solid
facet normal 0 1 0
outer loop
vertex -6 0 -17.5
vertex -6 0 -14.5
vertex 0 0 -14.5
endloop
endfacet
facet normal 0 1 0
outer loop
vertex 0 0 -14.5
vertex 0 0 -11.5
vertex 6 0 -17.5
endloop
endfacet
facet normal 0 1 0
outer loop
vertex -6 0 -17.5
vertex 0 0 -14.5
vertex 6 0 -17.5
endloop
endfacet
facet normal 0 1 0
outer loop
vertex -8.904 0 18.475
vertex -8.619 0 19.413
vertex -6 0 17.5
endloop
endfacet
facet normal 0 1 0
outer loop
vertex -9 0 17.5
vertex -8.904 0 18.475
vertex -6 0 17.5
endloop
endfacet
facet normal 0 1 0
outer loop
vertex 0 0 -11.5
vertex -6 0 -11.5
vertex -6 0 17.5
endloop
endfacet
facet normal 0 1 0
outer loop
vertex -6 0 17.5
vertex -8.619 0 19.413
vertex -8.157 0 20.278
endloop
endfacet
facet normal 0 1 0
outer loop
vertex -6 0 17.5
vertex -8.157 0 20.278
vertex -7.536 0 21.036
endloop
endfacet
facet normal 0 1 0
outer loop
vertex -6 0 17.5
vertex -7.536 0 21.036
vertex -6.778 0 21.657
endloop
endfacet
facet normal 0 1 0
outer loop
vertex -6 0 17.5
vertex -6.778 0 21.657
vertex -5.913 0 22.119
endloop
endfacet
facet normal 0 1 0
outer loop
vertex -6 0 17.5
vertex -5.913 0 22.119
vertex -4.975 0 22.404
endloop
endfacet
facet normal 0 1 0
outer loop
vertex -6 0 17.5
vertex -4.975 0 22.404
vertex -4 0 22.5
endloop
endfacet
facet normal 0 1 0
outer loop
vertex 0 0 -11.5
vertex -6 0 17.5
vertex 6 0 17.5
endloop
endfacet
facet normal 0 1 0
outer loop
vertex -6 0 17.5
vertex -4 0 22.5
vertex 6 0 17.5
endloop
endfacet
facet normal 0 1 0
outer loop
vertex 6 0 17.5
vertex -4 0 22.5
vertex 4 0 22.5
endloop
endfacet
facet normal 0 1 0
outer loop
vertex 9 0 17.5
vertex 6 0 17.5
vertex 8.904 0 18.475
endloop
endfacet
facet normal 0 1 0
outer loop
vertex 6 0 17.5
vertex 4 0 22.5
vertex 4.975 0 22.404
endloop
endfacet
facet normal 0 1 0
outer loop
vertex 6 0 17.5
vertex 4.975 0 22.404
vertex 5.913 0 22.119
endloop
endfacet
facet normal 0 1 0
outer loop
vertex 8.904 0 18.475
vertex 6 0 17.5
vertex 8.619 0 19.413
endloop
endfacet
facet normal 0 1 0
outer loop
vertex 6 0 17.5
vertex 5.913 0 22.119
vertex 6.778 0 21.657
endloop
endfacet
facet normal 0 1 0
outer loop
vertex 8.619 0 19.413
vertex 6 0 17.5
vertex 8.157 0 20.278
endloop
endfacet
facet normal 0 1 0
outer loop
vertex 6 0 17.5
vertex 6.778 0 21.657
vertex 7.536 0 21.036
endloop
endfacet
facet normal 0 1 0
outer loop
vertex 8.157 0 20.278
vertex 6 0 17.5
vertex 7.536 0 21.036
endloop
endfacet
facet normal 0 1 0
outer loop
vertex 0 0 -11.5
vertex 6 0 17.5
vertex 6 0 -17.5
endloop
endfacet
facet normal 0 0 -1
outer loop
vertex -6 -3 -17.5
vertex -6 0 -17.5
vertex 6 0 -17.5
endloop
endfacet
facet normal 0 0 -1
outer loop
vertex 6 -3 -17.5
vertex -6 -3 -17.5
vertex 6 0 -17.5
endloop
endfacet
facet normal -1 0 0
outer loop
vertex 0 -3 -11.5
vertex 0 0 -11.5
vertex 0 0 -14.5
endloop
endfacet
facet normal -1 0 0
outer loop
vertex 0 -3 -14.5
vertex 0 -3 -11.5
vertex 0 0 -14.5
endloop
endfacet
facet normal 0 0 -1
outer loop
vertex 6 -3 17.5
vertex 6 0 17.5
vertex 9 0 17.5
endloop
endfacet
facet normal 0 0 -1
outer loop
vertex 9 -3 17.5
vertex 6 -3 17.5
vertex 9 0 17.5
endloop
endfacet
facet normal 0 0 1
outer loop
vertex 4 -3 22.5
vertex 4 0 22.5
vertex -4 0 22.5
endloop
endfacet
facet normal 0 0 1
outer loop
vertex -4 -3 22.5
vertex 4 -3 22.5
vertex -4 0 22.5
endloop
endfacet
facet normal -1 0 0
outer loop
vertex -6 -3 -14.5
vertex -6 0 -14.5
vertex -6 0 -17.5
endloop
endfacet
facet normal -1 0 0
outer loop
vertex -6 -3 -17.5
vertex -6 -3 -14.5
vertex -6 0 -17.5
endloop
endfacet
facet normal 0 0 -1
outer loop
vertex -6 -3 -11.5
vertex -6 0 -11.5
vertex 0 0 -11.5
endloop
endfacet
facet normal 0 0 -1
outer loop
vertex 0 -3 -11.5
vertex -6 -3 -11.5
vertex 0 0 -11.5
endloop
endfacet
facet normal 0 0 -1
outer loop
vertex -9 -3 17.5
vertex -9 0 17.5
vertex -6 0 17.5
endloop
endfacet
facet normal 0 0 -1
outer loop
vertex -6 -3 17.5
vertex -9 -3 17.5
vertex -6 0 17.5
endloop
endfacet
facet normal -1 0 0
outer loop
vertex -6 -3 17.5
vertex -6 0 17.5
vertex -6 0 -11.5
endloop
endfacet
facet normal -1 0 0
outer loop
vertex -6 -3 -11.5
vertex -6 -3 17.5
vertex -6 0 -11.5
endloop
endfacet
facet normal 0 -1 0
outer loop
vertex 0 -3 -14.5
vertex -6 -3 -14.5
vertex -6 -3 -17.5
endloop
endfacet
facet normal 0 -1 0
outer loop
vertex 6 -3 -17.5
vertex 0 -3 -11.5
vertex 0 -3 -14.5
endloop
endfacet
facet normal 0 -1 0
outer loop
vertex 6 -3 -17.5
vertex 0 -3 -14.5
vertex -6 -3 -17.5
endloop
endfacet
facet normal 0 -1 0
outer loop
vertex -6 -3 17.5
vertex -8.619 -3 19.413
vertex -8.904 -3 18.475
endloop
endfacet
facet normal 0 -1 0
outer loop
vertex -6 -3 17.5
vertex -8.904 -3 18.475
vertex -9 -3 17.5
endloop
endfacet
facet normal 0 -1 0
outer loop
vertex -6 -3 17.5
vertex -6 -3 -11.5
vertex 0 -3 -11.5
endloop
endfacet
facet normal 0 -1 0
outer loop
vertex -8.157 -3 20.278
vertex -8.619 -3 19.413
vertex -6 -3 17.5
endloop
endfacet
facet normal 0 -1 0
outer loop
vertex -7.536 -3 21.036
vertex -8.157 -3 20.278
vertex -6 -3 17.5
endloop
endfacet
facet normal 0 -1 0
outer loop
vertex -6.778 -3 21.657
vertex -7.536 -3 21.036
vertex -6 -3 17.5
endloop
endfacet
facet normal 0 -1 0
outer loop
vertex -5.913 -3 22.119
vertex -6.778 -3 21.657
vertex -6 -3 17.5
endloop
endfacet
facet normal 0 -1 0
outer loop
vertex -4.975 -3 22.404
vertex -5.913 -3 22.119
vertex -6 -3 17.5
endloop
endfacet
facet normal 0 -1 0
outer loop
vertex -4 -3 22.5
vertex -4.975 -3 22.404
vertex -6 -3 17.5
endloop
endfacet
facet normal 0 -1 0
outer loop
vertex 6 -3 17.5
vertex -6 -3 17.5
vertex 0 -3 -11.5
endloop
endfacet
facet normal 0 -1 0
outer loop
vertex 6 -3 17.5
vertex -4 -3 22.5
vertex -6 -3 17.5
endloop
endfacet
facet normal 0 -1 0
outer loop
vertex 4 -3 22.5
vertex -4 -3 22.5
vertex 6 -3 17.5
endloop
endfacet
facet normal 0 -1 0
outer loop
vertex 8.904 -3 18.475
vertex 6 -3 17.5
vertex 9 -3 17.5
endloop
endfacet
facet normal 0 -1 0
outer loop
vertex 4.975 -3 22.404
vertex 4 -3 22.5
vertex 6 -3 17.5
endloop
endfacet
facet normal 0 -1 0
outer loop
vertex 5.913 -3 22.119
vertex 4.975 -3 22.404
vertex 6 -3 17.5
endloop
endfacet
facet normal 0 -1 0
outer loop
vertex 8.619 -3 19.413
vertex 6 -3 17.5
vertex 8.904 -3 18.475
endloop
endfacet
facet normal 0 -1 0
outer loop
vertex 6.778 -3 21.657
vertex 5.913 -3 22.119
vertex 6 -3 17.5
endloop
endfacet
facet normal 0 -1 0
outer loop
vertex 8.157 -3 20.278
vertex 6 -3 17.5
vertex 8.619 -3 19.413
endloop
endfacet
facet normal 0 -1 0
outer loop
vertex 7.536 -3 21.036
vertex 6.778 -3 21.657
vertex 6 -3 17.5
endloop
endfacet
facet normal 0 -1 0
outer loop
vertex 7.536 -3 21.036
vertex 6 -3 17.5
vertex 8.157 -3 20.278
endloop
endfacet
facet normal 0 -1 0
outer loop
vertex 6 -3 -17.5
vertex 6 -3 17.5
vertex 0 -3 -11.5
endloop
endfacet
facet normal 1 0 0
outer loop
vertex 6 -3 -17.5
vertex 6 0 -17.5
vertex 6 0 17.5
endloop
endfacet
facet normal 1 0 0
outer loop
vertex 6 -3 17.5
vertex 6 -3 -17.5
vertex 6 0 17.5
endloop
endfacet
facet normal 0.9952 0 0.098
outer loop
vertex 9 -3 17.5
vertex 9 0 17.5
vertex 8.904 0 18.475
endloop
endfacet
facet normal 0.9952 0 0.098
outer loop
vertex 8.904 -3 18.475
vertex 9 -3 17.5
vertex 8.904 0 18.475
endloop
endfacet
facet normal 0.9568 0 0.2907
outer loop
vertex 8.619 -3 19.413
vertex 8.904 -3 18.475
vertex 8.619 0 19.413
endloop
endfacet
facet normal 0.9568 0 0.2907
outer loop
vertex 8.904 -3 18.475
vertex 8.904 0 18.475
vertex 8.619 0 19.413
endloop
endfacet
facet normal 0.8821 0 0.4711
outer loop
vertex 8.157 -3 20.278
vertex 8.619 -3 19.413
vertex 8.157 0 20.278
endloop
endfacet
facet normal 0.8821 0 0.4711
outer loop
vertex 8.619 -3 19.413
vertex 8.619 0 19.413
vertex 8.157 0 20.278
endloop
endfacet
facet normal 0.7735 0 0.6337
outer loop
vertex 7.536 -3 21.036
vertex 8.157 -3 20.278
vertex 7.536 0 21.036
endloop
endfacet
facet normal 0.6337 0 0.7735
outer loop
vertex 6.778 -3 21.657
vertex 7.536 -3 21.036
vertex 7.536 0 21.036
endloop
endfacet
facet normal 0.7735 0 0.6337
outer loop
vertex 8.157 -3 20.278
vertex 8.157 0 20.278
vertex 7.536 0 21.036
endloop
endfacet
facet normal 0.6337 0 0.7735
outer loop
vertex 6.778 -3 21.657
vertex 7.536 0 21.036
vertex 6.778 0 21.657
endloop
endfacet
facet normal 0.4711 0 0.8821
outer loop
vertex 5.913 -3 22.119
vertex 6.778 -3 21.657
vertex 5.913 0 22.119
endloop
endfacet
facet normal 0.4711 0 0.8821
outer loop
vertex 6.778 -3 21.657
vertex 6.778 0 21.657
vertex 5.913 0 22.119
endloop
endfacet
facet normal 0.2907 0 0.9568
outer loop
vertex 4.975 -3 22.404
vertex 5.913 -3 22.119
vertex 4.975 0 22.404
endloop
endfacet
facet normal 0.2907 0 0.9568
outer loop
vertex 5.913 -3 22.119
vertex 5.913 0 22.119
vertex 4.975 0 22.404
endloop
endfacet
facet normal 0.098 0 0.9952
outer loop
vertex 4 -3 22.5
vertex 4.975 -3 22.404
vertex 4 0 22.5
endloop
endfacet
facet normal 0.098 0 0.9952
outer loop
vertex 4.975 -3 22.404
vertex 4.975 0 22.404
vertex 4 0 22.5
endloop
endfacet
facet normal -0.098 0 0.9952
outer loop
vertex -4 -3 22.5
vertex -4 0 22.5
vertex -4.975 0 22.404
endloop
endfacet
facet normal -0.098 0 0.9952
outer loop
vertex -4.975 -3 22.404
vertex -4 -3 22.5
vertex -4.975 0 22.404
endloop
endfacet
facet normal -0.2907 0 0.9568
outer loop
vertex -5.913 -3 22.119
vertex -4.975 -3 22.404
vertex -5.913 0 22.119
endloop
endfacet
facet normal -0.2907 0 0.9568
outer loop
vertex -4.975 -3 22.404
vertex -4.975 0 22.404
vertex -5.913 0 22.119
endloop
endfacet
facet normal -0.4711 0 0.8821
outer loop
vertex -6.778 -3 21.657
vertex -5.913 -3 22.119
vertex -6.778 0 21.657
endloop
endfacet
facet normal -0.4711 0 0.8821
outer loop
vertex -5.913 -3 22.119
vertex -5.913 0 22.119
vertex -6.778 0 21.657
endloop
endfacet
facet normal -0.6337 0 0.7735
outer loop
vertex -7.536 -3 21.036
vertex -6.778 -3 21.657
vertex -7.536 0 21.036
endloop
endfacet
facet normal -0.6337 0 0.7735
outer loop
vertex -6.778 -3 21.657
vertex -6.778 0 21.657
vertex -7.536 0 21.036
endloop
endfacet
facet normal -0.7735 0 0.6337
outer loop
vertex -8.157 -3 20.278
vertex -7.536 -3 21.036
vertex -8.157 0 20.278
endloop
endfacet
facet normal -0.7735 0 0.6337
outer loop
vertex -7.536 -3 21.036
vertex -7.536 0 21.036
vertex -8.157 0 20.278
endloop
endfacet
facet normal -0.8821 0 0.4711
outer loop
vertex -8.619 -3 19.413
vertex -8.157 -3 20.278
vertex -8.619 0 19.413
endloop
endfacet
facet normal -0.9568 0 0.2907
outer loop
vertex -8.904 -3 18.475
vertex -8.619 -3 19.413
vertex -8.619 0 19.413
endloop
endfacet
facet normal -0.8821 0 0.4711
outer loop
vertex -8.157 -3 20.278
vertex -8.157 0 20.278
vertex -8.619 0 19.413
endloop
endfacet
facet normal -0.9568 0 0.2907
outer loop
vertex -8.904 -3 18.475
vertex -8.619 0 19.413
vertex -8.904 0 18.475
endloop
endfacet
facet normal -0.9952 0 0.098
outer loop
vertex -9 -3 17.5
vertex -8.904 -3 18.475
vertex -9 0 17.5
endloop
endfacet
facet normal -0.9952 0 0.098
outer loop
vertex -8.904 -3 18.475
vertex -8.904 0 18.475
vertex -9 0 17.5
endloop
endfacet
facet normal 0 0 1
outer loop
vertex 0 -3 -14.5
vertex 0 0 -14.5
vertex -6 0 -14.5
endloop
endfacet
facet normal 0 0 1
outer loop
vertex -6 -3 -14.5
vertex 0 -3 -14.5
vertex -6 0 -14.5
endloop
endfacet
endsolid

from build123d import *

# Parameters (mm, degrees)
F1_DEPTH = 3


with BuildPart() as f1:
    # F0 (on Front) → F1 (new body)
    with BuildSketch(Plane.XZ):
        with BuildLine():
            Line((-6, -17.5), (6, -17.5))
            Line((6, -17.5), (6, 17.5))
            Line((6, 17.5), (9, 17.5))
            ThreePointArc((9, 17.5), (7.535534, 21.035534), (4, 22.5))
            Line((4, 22.5), (-4, 22.5))
            ThreePointArc((-4, 22.5), (-7.535534, 21.035534), (-9, 17.5))
            Line((-9, 17.5), (-6, 17.5))
            Line((-6, 17.5), (-6, -11.5))
            Line((-6, -11.5), (0, -11.5))
            Line((0, -11.5), (0, -14.5))
            Line((0, -14.5), (-6, -14.5))
            Line((-6, -14.5), (-6, -17.5))
        make_face()
    extrude(amount=F1_DEPTH)


solid = f1.part
